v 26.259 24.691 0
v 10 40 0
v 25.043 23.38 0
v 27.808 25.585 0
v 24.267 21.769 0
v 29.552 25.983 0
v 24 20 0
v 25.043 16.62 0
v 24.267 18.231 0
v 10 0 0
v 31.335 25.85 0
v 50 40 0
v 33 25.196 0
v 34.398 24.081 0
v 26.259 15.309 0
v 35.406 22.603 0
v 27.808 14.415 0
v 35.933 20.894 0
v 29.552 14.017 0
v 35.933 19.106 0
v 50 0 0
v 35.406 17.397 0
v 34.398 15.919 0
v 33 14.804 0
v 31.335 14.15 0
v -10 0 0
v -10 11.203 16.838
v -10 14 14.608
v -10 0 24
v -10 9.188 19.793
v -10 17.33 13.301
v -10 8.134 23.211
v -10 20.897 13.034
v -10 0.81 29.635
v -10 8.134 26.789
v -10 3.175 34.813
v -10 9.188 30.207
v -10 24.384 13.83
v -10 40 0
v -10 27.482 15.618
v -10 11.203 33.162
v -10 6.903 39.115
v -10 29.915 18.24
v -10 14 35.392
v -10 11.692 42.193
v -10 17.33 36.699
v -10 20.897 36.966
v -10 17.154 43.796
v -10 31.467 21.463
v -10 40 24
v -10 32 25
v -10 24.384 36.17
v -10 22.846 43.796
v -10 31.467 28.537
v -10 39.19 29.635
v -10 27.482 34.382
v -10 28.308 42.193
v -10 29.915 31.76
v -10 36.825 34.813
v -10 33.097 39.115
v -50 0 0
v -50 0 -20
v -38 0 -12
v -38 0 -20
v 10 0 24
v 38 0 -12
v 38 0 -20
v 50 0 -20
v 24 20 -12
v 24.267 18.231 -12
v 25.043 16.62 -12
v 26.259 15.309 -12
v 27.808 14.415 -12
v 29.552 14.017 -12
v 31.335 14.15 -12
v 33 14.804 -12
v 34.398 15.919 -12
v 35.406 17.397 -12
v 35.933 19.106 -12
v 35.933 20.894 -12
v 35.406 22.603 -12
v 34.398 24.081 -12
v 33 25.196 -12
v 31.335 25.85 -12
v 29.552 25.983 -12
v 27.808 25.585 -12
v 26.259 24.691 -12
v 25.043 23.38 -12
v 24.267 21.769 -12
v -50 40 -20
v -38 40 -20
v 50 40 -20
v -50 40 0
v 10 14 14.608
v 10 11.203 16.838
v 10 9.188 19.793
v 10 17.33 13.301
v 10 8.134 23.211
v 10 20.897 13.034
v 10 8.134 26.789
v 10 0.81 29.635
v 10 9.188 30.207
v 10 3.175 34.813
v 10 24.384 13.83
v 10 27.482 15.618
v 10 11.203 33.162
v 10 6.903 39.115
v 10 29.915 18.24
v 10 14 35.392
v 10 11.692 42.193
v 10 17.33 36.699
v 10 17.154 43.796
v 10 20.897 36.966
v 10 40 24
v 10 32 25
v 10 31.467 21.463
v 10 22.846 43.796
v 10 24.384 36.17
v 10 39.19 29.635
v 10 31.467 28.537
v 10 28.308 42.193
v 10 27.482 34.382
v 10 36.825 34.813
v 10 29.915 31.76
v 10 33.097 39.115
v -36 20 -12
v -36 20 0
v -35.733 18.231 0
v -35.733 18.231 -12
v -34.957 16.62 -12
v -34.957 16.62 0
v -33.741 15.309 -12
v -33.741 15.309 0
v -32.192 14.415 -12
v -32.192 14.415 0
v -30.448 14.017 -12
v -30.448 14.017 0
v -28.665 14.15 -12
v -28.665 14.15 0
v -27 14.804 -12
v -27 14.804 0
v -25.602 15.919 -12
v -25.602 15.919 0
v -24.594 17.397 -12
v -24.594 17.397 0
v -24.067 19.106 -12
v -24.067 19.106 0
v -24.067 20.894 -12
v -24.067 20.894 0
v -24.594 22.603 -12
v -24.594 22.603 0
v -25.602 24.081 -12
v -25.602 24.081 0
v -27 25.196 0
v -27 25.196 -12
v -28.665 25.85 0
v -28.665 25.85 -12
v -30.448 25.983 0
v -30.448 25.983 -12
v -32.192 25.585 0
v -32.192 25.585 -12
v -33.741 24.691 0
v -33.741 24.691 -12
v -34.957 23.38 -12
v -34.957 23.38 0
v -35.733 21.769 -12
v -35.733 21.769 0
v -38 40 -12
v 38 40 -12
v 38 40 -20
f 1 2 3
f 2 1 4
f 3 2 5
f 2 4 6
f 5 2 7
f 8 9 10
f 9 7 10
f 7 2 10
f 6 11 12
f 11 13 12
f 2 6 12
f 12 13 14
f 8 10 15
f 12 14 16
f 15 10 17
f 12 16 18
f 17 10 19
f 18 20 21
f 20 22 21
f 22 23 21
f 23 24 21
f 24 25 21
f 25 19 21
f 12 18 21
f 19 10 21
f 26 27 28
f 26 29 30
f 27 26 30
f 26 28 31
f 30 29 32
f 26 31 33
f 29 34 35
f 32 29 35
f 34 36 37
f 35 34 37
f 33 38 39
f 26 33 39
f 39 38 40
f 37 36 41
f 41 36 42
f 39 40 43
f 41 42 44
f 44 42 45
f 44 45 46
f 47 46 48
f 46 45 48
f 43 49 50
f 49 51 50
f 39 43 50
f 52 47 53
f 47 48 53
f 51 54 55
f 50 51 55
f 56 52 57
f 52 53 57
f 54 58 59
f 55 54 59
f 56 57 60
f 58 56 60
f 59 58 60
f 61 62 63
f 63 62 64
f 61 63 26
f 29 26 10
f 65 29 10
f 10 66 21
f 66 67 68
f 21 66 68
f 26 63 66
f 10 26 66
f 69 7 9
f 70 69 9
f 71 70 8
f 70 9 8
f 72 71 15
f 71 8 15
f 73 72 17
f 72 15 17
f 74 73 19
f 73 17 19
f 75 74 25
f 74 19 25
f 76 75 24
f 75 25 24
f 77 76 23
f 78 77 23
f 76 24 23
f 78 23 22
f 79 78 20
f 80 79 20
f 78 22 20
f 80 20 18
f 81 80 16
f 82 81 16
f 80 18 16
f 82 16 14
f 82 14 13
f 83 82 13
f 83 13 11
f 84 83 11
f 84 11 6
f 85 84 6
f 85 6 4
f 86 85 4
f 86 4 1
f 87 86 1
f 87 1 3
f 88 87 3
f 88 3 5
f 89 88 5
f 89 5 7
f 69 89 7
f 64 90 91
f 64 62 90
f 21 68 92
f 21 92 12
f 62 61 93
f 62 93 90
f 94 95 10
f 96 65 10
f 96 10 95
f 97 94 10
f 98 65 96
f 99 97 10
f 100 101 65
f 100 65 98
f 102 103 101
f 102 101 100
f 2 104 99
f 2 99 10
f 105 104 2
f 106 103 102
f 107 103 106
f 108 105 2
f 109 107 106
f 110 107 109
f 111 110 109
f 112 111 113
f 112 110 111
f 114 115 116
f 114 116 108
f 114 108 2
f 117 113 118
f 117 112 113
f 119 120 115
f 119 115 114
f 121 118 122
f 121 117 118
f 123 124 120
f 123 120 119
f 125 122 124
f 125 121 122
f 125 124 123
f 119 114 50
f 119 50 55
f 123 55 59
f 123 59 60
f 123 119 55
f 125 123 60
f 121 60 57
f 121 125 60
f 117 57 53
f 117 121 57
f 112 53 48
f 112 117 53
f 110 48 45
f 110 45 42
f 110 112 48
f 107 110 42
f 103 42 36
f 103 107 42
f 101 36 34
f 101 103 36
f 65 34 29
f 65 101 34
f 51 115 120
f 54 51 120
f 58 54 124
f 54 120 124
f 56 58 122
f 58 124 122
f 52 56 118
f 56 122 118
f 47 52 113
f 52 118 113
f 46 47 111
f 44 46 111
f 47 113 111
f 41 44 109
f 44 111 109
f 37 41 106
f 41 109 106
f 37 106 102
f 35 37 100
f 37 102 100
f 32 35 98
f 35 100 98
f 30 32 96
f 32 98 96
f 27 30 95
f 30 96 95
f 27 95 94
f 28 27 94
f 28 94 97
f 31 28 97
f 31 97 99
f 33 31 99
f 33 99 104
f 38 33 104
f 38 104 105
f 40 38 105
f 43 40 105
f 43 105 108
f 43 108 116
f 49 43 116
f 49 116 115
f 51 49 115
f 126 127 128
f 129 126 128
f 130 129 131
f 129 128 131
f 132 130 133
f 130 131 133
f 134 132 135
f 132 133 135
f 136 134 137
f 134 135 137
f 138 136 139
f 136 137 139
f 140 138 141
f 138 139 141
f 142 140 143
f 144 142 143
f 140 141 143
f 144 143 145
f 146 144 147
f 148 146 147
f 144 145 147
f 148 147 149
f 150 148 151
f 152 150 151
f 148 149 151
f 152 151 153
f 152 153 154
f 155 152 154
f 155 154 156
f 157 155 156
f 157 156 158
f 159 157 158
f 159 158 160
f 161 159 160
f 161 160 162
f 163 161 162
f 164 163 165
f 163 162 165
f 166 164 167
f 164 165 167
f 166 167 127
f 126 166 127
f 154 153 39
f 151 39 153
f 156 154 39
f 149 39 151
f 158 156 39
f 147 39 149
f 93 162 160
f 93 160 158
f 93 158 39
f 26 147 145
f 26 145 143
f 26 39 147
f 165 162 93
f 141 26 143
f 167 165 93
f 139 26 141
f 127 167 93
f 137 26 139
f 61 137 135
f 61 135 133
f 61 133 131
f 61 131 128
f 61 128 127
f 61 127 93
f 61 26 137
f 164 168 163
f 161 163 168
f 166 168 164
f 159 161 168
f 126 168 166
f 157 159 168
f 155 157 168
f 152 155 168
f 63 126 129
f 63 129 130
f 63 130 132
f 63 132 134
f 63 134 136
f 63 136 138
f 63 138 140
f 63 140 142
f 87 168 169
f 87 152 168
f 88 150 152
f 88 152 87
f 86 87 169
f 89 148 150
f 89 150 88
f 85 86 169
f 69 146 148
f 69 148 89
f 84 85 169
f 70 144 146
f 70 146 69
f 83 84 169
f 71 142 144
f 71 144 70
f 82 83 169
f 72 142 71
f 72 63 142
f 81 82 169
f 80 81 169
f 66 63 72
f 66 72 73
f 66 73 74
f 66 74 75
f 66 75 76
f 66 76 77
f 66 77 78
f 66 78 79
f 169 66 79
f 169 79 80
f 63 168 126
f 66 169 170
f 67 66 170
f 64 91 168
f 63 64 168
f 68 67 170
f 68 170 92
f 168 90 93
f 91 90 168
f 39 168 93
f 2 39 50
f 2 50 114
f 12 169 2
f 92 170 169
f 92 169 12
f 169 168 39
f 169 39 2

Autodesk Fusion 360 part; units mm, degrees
sketch "Sketch1" plane through (0, 0, 0) normal (0, 1, 0) x (1, 0, 0)
  line L0 (10, 0) -> (50, 0)
  line L1 (-50, 0) -> (-50, 20)
  line L2 (-50, 20) -> (-38, 20)
  line L3 (-38, 20) -> (-38, 12)
  line L4 (-38, 12) -> (38, 12)
  line L5 (38, 12) -> (38, 20)
  line L6 (38, 20) -> (50, 20)
  line L7 (50, 20) -> (50, 0)
  line L8 (50, 20) -> (50, 0)
  line L9 (50, 0) -> (10, 0)
  line L10 (50, 0) -> (10, 0)
  line L11 (-10, 0) -> (-50, 0)
  line L12 (-10, 0) -> (-10, -24)
  line L13 (-10, -24) -> (10, -24)
  line L14 (10, -24) -> (10, 0)
  dimension "d1" = 50
  dimension "d2" = 100
  dimension "d3" = 20
  dimension "d4" = 12
  dimension "d5" = 8
  dimension "d6" = 76
  dimension "d7" = 8
  dimension "d8" = 20
  dimension "d9" = 40
  dimension "d13" = 24
  dimension "d14" = 20
extrude "Extrude1" add sketch "Sketch1" along normal blind 40
sketch "Sketch2" plane through (0, 0, 0) normal (0, 0, 1) x (-1, 0, 0)
  line L0 (-10, 0) -> (-50, 0)
  line L1 (-50, 0) -> (-50, -40)
  line L2 (-50, -40) -> (-10, -40)
  line L3 (-10, -40) -> (-10, 0)
  line L4 (-30, -40) -> (-30, 0)
  circle A0 centre (-30, -20) radius 6
  line L5 (50, 0) -> (30, 0)
  line L6 (30, 0) -> (30, -40)
  circle A1 centre (30, -20) radius 6
  dimension "d17" = 12
  dimension "d18" = 20
  dimension "d19" = 12
extrude "Extrude2" cut sketch "Sketch2" against normal blind 20 contours L4 A0 | L4 A0
sketch "Sketch3" plane through (0, 0, 0) normal (0, 0, 1) x (-1, 0, 0)
  line L0 (50, 0) -> (10, 0)
  line L1 (10, 0) -> (10, -40)
  line L2 (10, -40) -> (50, -40)
  line L3 (50, -40) -> (50, 0)
  line L4 (50, 0) -> (30, 0)
  line L5 (30, 0) -> (30, -40)
  circle A0 centre (30, -20) radius 6
  dimension "d22" = 12
extrude "Extrude3" cut sketch "Sketch3" against normal blind 20 contours L5 A0 | L5 A0
sketch "Sketch4" plane through (10, 0, 0) normal (1, 0, 0) x (0, 1, 0)
  line L0 (0, 24) -> (0, 0)
  line L1 (0, 0) -> (40, 0)
  line L2 (40, 0) -> (40, 24)
  line L3 (40, 24) -> (0, 24)
  circle A0 centre (20, 24) radius 20
  dimension "d25" = 40
extrude "Extrude4" add sketch "Sketch4" against normal blind 20 contours L3 A0 picked at (20.4982, 30.648)
sketch "Sketch5" plane through (10, 0, 0) normal (1, 0, 0) x (0, 1, 0)
  line L0 (0, 24) -> (0, 0)
  line L1 (0, 0) -> (40, 0)
  line L2 (40, 0) -> (40, 24)
  arc A0 (40, 24) -> (0, 24) centre (20, 24) ccw
  line L3 (0, 0) -> (0, 25)
  line L4 (0, 25) -> (40, 25)
  circle A1 centre (20, 25) radius 12
  dimension "d28" = 40
  dimension "d29" = 24
extrude "Extrude5" cut sketch "Sketch5" against normal blind 20 contours L4 A1 | L4 A1
sketch "Sketch6" plane through (0, 0, 0) normal (0, -1, 0) x (1, 0, 0)
  line L0 (-10, 24) -> (-10, 0)
  line L1 (-10, 0) -> (-50, 0)
  line L2 (-50, 0) -> (-50, -20)
  line L3 (-50, -20) -> (-38, -20)
  line L4 (-38, -20) -> (-38, -12)
  line L5 (-38, -12) -> (38, -12)
  line L6 (38, -12) -> (38, -20)
  line L7 (38, -20) -> (50, -20)
  line L8 (50, -20) -> (50, 0)
  line L9 (50, 0) -> (10, 0)
  line L10 (10, 0) -> (10, 24)
  line L11 (10, 24) -> (-10, 24)
